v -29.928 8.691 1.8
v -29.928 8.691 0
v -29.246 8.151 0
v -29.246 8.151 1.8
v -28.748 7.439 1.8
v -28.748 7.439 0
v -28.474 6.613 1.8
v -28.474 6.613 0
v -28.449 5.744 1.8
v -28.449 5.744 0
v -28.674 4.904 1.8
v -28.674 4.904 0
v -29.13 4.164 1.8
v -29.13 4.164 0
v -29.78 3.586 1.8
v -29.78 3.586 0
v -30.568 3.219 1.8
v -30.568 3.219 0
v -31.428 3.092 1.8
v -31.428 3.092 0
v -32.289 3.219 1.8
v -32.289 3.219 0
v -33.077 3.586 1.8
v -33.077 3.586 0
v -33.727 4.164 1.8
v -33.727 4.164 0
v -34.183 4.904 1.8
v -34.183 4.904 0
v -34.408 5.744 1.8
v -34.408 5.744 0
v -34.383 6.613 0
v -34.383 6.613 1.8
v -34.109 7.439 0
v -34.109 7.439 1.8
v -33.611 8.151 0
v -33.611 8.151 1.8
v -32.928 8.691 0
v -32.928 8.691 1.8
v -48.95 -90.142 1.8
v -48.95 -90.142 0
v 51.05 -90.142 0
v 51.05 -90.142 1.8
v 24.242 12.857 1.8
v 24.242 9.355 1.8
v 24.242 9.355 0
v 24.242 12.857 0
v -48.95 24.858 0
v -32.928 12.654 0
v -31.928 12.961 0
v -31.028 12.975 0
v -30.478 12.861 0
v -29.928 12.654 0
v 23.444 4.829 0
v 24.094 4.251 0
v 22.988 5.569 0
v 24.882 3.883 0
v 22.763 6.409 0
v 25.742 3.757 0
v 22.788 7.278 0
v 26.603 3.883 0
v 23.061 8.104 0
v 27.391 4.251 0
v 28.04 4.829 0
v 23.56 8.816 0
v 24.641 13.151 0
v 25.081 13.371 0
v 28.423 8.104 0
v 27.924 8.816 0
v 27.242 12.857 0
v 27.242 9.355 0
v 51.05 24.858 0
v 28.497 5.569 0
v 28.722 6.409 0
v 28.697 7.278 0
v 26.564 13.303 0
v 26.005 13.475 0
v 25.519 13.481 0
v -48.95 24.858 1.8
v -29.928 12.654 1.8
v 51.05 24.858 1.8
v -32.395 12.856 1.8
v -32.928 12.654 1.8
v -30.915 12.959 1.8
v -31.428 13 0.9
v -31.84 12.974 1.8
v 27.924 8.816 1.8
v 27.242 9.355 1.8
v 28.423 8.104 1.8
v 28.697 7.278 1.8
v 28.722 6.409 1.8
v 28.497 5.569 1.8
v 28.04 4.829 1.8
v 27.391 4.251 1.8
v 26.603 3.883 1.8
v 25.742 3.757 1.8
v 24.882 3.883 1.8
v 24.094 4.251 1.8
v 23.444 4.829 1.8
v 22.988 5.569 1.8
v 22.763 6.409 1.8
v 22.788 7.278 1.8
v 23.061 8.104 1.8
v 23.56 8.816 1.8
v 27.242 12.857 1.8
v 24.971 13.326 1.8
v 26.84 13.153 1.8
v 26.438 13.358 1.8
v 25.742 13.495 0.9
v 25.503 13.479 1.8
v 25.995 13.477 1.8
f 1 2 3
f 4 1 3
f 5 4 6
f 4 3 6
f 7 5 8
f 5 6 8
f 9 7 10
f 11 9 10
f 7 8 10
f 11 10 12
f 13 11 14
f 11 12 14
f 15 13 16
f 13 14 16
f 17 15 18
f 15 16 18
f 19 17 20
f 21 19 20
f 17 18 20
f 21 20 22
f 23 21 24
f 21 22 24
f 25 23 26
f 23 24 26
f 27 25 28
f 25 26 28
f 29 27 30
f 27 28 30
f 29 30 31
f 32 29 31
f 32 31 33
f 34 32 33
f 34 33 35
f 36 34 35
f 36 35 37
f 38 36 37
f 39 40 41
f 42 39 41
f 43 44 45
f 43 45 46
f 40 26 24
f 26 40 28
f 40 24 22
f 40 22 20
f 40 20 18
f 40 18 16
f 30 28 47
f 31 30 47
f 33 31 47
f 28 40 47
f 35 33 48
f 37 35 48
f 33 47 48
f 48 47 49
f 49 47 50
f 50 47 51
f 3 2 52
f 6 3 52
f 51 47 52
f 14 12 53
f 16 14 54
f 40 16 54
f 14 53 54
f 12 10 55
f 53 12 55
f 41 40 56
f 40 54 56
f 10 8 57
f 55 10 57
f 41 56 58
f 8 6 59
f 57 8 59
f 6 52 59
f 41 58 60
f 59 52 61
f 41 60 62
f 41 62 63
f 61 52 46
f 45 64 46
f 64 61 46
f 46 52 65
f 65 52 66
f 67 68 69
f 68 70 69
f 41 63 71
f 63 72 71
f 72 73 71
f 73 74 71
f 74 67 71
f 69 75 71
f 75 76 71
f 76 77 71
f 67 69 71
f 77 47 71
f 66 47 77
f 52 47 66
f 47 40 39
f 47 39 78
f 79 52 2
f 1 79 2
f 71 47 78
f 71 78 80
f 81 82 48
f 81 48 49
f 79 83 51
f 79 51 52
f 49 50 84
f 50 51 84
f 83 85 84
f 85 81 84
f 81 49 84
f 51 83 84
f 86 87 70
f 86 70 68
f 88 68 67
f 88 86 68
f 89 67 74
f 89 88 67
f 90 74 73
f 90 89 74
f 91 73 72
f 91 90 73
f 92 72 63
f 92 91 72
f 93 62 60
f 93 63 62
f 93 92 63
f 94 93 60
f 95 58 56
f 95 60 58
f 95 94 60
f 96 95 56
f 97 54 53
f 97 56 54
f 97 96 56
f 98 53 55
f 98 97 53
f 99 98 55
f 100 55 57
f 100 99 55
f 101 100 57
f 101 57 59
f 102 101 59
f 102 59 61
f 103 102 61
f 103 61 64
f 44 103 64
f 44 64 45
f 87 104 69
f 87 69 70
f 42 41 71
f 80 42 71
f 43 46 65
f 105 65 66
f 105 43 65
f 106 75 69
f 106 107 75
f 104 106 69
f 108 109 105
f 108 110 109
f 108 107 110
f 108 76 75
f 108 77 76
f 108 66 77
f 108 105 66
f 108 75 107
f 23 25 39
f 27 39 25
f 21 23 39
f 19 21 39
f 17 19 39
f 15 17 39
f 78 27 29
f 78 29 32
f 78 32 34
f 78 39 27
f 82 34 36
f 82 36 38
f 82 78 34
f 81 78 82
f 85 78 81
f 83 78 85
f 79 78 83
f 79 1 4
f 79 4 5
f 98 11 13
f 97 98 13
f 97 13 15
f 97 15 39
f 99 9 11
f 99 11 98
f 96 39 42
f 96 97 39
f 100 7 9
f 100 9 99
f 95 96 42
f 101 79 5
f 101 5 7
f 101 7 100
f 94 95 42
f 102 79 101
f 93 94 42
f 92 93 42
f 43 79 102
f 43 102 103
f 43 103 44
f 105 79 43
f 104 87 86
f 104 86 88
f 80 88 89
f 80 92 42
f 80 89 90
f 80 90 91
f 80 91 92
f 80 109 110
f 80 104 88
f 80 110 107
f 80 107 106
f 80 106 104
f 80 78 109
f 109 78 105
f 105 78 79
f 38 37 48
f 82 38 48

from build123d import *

# Parameters (mm, degrees)
IZIM1_W                     = 100
IZIM1_H                     = 115
Y_KSEKLIK_EKSTR_ZYON1_DEPTH = 1.8
KES_EKSTR_ZYON3_DEPTH       = 10
KES_EKSTR_ZYON5_DEPTH       = 10


with BuildPart() as part:
    # Çizim1 → Yükseklik-Ekstrüzyon1 (new body)
    with BuildSketch(Plane.XY):
        with Locations((1.04956231, -32.641643059)):
            Rectangle(IZIM1_W, IZIM1_H)
    extrude(amount=Y_KSEKLIK_EKSTR_ZYON1_DEPTH)

    # Çizim2 → Kes-Ekstrüzyon3 (cut)
    with BuildSketch(Plane.XY):
        with BuildLine():
            Line((-32.928401058, 8.690561448), (-32.928401058, 12.65398339))
            add(Edge.make_bspline(
                [(-32.928401058, 12.65398339), (-31.428401058, 13.345574781), (-29.928401058, 12.65398339)],
                knots=[0, 0, 0, 1, 1, 1], degree=2))
            Line((-29.928401058, 12.65398339), (-29.928401058, 8.690561448))
            ThreePointArc((-29.928401058, 8.690561448), (-31.428401058, 3.092485237), (-32.928401058, 8.690561448))
        make_face()
    extrude(amount=KES_EKSTR_ZYON3_DEPTH, mode=Mode.SUBTRACT)

    # Çizim4 → Kes-Ekstrüzyon5 (cut)
    with BuildSketch(Plane.XY.offset(1.8)):
        with BuildLine():
            Line((24.242256458, 9.355414165), (24.242256458, 12.856809752))
            add(Edge.make_bspline(
                [(24.242256458, 12.856809752), (25.742256458, 14.132745358), (27.242256458, 12.856809752)],
                knots=[0, 0, 0, 1, 1, 1], degree=2))
            Line((27.242256458, 12.856809752), (27.242256458, 9.355414165))
            ThreePointArc((27.242256458, 9.355414165), (25.742256458, 3.757337953), (24.242256458, 9.355414165))
        make_face()
    extrude(amount=-KES_EKSTR_ZYON5_DEPTH, mode=Mode.SUBTRACT)


solid = part.part
